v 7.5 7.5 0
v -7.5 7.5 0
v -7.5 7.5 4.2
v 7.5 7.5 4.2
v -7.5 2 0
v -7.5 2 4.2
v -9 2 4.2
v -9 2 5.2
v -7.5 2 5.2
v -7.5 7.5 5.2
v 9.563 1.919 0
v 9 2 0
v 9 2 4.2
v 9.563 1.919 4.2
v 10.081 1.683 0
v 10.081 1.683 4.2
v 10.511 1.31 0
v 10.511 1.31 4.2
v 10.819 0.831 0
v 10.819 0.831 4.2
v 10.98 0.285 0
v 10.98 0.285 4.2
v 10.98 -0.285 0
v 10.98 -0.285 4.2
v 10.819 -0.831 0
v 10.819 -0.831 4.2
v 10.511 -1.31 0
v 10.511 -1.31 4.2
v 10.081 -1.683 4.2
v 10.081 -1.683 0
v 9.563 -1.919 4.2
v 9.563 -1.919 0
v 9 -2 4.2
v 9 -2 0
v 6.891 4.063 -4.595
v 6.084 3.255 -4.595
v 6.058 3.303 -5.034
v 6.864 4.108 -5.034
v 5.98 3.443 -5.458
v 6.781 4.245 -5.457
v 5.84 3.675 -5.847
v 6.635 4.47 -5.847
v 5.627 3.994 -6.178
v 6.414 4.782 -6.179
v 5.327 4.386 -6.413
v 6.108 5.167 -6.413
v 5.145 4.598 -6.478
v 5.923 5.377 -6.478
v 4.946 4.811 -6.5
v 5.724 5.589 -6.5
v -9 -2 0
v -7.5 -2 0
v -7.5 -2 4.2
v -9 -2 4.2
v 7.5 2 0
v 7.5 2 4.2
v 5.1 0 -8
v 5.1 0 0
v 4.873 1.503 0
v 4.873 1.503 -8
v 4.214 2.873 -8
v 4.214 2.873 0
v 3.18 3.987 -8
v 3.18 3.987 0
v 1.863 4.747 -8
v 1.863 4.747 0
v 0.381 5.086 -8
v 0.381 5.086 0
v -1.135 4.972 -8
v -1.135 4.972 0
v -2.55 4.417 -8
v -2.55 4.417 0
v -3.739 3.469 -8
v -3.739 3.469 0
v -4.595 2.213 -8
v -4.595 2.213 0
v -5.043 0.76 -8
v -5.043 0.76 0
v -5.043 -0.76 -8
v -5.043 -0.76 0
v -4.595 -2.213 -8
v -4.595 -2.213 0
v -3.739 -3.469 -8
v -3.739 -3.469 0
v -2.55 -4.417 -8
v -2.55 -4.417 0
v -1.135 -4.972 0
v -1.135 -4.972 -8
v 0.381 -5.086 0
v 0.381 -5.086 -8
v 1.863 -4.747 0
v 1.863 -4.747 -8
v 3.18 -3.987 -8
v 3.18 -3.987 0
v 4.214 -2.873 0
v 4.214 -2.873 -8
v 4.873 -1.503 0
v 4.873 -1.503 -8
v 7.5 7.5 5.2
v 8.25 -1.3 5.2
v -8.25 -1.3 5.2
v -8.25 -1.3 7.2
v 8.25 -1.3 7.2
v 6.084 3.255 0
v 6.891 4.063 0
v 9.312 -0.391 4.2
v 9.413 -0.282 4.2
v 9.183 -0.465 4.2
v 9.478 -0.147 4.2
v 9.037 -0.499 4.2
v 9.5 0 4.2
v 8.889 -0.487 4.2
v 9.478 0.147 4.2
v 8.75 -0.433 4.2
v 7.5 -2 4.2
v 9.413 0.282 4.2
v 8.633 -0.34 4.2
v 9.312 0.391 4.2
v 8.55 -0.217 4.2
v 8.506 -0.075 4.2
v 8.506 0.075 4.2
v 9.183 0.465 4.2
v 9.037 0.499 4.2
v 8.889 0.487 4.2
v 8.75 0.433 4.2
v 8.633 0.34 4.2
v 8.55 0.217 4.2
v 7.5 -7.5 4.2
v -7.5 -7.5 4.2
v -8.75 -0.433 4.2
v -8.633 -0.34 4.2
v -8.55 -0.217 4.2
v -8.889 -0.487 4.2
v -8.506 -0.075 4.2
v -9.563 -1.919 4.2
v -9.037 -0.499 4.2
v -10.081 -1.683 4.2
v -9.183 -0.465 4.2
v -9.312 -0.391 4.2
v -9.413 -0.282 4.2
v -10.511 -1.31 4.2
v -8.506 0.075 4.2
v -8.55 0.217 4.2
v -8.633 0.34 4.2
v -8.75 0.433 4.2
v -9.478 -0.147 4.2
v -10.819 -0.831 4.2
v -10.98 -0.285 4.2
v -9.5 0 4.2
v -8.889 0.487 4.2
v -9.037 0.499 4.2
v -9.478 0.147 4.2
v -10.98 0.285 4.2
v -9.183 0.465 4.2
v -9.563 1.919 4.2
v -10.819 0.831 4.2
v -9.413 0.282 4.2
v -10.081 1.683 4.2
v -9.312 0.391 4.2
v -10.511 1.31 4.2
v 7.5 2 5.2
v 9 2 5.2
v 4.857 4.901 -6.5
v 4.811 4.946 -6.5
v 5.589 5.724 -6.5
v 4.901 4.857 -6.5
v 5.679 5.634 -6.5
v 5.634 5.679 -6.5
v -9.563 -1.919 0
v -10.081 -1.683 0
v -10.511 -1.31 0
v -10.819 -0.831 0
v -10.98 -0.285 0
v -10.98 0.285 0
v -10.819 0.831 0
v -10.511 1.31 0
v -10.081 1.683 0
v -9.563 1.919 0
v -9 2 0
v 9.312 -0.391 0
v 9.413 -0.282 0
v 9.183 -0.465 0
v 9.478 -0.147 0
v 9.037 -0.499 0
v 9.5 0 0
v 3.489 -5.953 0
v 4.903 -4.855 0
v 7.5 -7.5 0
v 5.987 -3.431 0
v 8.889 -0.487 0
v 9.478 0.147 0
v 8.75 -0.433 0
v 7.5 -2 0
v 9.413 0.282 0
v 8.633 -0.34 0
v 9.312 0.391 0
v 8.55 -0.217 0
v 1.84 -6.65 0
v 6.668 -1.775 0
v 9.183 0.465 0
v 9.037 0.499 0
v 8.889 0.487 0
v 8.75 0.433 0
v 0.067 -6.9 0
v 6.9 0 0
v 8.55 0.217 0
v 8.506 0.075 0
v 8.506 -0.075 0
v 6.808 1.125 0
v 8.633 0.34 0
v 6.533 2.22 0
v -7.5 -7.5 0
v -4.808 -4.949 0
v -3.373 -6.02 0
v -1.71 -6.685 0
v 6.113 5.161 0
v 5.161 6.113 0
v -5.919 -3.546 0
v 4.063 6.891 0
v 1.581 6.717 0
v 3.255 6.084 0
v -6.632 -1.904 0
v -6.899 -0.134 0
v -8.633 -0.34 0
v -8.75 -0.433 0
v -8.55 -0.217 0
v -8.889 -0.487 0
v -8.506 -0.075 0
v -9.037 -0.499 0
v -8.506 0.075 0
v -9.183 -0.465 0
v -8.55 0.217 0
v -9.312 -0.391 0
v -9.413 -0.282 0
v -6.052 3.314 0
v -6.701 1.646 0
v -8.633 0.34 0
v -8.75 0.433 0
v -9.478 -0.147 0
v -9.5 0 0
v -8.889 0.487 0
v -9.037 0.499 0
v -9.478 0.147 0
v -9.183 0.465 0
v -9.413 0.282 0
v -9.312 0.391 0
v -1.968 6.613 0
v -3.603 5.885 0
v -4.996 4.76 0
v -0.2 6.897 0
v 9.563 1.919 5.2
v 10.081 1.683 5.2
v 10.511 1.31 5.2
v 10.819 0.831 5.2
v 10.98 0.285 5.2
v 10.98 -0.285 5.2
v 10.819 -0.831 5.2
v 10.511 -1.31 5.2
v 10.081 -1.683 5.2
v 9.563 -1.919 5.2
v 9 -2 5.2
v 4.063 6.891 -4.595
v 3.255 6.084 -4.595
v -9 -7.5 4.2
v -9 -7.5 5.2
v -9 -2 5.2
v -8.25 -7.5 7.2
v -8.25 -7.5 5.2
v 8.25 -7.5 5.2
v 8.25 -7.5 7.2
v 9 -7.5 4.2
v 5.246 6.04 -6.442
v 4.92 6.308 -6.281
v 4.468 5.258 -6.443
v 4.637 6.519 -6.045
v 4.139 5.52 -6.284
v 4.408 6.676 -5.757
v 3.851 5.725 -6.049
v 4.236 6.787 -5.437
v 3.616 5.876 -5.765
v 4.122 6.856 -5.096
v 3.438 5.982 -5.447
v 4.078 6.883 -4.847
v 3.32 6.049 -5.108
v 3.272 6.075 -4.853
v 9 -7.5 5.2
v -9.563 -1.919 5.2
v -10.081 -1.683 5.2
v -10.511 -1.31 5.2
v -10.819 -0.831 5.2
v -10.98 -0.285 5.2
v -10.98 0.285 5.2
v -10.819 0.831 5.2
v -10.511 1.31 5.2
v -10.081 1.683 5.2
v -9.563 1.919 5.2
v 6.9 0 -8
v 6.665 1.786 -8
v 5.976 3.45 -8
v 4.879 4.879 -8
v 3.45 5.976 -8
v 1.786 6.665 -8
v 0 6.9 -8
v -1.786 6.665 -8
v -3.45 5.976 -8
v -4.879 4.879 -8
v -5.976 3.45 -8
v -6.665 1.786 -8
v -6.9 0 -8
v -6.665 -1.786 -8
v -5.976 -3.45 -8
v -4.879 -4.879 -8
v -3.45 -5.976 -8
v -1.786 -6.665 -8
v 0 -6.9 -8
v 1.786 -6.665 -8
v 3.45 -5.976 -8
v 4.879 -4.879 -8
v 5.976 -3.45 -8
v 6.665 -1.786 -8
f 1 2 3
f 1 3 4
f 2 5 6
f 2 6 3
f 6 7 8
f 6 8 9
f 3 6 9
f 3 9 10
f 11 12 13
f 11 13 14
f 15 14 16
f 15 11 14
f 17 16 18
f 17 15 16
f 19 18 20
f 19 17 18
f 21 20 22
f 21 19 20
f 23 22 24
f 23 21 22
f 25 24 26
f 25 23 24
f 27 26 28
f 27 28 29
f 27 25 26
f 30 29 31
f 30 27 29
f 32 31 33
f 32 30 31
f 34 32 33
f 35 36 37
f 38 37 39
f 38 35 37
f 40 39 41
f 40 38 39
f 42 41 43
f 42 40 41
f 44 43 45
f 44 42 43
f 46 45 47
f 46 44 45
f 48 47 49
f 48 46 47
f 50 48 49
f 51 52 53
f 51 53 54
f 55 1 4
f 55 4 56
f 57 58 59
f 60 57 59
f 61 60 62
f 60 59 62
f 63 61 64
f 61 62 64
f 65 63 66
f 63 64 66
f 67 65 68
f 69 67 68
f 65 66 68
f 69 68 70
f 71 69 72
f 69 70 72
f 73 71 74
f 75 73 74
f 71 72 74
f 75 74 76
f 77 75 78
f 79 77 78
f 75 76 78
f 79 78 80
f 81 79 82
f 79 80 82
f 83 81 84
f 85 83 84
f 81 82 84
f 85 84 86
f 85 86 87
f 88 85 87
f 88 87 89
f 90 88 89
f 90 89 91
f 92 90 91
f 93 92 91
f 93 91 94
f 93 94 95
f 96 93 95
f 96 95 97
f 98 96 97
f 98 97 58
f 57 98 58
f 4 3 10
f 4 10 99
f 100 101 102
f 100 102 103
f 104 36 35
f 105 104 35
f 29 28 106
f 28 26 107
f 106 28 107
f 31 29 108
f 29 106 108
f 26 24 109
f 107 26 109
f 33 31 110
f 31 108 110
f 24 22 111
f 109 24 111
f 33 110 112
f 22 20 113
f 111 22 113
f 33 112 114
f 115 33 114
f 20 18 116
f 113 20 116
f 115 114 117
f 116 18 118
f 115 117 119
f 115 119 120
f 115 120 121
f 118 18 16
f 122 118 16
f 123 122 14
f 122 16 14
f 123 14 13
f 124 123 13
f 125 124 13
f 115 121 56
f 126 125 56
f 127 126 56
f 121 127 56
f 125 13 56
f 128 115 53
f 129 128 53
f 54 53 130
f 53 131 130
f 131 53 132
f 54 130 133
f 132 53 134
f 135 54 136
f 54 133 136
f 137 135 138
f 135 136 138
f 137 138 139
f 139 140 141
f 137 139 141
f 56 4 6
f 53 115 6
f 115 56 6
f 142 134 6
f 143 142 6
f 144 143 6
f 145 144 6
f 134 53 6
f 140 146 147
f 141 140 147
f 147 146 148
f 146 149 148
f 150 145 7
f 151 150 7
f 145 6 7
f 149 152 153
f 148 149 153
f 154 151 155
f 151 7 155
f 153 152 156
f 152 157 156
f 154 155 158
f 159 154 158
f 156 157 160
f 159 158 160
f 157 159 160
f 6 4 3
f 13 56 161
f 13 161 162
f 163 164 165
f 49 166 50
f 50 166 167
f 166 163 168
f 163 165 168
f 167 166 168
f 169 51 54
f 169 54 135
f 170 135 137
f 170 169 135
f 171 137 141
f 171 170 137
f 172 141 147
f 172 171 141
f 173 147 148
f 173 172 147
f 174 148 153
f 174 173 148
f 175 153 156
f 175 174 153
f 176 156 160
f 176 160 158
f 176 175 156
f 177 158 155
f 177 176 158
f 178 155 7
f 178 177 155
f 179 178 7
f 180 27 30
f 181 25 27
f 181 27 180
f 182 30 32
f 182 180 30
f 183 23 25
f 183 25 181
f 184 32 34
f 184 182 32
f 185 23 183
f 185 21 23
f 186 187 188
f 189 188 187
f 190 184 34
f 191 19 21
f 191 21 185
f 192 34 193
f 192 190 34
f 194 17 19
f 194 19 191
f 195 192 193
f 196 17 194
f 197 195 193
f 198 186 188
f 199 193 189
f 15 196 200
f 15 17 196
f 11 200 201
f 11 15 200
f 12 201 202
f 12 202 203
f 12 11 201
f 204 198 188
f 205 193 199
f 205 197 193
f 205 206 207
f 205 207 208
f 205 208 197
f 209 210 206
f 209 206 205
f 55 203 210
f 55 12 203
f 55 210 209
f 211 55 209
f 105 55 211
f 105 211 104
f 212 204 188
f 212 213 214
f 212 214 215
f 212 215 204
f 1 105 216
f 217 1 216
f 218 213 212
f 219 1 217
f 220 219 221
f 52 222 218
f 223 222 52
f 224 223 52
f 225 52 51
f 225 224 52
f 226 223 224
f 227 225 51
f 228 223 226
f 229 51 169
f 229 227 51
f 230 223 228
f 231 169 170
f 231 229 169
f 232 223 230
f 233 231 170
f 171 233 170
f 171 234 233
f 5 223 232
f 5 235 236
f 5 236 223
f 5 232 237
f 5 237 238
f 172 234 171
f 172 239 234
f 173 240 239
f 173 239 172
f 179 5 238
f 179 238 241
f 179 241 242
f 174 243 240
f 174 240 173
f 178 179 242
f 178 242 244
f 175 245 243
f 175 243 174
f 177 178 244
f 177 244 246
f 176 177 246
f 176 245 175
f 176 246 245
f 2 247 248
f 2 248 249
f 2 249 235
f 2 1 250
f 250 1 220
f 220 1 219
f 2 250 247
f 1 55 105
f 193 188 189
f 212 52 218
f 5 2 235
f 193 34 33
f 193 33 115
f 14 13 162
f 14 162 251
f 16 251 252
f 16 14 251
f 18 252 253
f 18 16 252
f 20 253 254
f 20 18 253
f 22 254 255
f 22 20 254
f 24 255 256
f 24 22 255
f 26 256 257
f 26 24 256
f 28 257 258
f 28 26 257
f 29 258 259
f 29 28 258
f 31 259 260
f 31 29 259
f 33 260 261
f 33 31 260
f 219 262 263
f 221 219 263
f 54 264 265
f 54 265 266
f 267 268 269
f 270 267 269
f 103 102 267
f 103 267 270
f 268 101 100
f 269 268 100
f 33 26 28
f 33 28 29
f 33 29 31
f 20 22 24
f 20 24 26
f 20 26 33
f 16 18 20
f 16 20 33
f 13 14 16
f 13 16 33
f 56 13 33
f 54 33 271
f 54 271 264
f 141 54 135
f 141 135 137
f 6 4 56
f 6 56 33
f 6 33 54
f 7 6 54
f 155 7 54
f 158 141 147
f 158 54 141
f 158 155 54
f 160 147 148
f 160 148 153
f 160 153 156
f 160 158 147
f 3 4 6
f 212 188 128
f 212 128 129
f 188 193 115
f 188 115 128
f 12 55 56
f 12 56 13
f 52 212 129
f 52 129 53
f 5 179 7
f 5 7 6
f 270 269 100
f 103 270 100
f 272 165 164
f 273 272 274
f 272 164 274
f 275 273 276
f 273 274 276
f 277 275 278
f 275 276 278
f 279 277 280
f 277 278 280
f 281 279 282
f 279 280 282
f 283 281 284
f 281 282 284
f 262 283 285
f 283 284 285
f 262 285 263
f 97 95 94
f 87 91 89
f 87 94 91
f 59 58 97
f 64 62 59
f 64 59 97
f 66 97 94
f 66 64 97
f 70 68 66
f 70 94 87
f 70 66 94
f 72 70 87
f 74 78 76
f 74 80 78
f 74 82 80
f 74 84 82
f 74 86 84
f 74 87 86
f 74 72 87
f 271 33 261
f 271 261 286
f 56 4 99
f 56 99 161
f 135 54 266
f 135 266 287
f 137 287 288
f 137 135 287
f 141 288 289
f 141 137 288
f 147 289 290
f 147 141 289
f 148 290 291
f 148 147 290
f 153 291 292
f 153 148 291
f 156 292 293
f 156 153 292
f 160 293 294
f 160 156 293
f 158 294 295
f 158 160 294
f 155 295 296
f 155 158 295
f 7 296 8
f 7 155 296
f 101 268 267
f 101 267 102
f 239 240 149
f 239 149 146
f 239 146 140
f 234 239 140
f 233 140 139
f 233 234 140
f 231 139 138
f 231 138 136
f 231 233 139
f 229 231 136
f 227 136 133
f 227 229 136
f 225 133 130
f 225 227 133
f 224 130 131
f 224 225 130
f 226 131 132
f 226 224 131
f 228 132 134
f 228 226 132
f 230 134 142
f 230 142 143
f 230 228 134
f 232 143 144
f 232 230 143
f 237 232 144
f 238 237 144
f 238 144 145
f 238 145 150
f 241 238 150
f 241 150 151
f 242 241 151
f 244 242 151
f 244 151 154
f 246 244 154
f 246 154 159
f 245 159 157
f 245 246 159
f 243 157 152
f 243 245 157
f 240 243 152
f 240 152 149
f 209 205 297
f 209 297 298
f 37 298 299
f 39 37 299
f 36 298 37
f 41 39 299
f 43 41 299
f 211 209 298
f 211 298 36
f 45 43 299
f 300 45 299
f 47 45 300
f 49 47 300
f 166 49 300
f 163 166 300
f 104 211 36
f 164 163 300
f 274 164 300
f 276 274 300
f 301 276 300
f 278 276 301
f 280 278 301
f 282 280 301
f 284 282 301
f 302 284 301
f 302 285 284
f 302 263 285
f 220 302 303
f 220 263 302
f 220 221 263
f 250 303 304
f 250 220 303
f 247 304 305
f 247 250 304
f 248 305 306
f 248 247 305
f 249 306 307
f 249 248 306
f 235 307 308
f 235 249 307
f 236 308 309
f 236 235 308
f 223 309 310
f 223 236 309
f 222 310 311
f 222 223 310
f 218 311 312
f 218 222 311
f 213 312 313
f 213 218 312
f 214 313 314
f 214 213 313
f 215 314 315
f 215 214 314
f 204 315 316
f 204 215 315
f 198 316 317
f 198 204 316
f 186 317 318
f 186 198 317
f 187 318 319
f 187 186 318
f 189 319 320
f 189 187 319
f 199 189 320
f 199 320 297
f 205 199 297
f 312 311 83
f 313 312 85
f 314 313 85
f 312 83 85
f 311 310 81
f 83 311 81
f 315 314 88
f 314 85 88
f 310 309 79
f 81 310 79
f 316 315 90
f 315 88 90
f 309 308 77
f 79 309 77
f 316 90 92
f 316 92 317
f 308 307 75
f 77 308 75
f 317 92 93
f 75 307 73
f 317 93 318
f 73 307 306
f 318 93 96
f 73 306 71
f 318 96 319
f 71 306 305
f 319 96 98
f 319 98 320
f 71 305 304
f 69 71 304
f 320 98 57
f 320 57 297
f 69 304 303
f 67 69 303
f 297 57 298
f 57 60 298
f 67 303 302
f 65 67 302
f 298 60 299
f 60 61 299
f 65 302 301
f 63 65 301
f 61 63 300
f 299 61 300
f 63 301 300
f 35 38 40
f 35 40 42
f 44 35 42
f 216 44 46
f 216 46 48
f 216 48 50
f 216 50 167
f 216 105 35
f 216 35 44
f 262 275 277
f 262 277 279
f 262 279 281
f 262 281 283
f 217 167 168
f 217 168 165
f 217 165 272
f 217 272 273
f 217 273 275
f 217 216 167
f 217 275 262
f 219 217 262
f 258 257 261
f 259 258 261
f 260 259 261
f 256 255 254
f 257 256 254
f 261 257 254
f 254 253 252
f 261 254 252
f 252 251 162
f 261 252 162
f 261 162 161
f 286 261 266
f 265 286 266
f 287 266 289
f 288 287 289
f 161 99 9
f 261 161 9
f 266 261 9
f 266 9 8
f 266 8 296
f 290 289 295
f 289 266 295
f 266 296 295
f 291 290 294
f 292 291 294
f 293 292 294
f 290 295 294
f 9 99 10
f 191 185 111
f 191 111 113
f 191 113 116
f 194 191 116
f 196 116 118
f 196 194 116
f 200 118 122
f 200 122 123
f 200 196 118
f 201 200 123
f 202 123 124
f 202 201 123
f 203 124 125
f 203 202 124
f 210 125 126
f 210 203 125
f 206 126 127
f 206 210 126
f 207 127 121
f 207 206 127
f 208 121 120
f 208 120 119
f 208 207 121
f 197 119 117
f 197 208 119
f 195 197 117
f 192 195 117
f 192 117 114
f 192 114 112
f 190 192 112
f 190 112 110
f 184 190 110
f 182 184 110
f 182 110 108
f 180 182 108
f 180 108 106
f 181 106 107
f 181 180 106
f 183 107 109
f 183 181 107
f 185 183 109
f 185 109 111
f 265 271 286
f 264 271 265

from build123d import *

# Parameters (mm, degrees)
BOSS_EXTRUDE1_DEPTH      = 8
BOSS_EXTRUDE2_DEPTH      = 6.5
FILLET1_R                = 1.905
TAP_DRILL_FOR_M12_TAP1_D = 10.2
SKETCH4_R                = 0.5
BOSS_EXTRUDE3_DEPTH      = 4.2
BOSS_EXTRUDE4_DEPTH      = 1
SKETCH6_W                = 16.5
SKETCH6_H                = 6.2
BOSS_EXTRUDE5_DEPTH      = 2


with BuildPart() as part:
    # Sketch1 → Boss-Extrude1 (new body)
    with BuildSketch(Plane.XY):
        with BuildLine():
            ThreePointArc((6.083795985, 3.25536886), (4.87903679, 4.87903679), (3.25536886, 6.083795985))
            ThreePointArc((3.25536886, 6.083795985), (-5.919123463, -3.545980461), (6.9, 0))
            ThreePointArc((6.9, 0), (6.692839169, 1.678065509), (6.083795985, 3.25536886))
        make_face()
    extrude(amount=-BOSS_EXTRUDE1_DEPTH)

    # Sketch1<3> → Boss-Extrude2 (add)
    with BuildSketch(Plane.XY):
        with BuildLine():
            Line((4.063012013, 6.891439137), (3.25536886, 6.083795985))
            ThreePointArc((3.25536886, 6.083795985), (4.87903679, 4.87903679), (6.083795985, 3.25536886))
            Line((6.083795985, 3.25536886), (6.891439137, 4.063012013))
            ThreePointArc((6.891439137, 4.063012013), (5.656854249, 5.656854249), (4.063012013, 6.891439137))
        make_face()
    extrude(amount=-BOSS_EXTRUDE2_DEPTH)

    # Fillet1
    fillet1_edges = [part.edges().sort_by_distance(p)[0] for p in [
        (3.659190436, 6.487617561, -6.5),
        (6.487617561, 3.659190436, -6.5),
    ]]
    fillet(fillet1_edges, radius=FILLET1_R)

    # Tap Drill for M12 Tap1 (through all)
    with Locations(Plane(origin=(0, 0, -8), x_dir=(-1, 0, 0), z_dir=(0, 0, -1))):
        with Locations((0, 0)):
            Hole(TAP_DRILL_FOR_M12_TAP1_D / 2)

    # Sketch4 → Boss-Extrude3 (add)
    with BuildSketch(Plane.XY):
        with BuildLine():
            Line((-7.5, 7.5), (7.5, 7.5))
            Line((7.5, 7.5), (7.5, 2))
            Line((7.5, 2), (9, 2))
            ThreePointArc((9, 2), (11, 0), (9, -2))
            Line((9, -2), (7.5, -2))
            Line((7.5, -2), (7.5, -7.5))
            Line((7.5, -7.5), (-7.5, -7.5))
            Line((-7.5, -7.5), (-7.5, -2))
            Line((-7.5, -2), (-9, -2))
            ThreePointArc((-9, -2), (-11, 0), (-9, 2))
            Line((-9, 2), (-7.5, 2))
            Line((-7.5, 2), (-7.5, 7.5))
        make_face()
        with Locations((9, 0)):
            Circle(SKETCH4_R, mode=Mode.SUBTRACT)
        with Locations((-9, 0)):
            Circle(SKETCH4_R, mode=Mode.SUBTRACT)
    extrude(amount=BOSS_EXTRUDE3_DEPTH)


with BuildPart() as body_2:
    # Sketch5 → Boss-Extrude4 (new body)
    with BuildSketch(Plane.XY.offset(4.2)):
        with BuildLine():
            Line((9, -2), (9, -7.5))
            Line((9, -7.5), (-9, -7.5))
            Line((-9, -7.5), (-9, -2))
            ThreePointArc((-9, -2), (-11, 0), (-9, 2))
            Line((-9, 2), (-7.5, 2))
            Line((-7.5, 2), (-7.5, 7.5))
            Line((-7.5, 7.5), (7.5, 7.5))
            Line((7.5, 7.5), (7.5, 2))
            Line((7.5, 2), (9, 2))
            ThreePointArc((9, 2), (11, 0), (9, -2))
        make_face()
    extrude(amount=BOSS_EXTRUDE4_DEPTH)


with BuildPart() as body_3:
    # Sketch6 → Boss-Extrude5 (new body)
    with BuildSketch(Plane.XY.offset(5.2)):
        with Locations((0, -4.4)):
            Rectangle(SKETCH6_W, SKETCH6_H)
    extrude(amount=BOSS_EXTRUDE5_DEPTH)


solid = Compound([part.part, body_2.part, body_3.part])
